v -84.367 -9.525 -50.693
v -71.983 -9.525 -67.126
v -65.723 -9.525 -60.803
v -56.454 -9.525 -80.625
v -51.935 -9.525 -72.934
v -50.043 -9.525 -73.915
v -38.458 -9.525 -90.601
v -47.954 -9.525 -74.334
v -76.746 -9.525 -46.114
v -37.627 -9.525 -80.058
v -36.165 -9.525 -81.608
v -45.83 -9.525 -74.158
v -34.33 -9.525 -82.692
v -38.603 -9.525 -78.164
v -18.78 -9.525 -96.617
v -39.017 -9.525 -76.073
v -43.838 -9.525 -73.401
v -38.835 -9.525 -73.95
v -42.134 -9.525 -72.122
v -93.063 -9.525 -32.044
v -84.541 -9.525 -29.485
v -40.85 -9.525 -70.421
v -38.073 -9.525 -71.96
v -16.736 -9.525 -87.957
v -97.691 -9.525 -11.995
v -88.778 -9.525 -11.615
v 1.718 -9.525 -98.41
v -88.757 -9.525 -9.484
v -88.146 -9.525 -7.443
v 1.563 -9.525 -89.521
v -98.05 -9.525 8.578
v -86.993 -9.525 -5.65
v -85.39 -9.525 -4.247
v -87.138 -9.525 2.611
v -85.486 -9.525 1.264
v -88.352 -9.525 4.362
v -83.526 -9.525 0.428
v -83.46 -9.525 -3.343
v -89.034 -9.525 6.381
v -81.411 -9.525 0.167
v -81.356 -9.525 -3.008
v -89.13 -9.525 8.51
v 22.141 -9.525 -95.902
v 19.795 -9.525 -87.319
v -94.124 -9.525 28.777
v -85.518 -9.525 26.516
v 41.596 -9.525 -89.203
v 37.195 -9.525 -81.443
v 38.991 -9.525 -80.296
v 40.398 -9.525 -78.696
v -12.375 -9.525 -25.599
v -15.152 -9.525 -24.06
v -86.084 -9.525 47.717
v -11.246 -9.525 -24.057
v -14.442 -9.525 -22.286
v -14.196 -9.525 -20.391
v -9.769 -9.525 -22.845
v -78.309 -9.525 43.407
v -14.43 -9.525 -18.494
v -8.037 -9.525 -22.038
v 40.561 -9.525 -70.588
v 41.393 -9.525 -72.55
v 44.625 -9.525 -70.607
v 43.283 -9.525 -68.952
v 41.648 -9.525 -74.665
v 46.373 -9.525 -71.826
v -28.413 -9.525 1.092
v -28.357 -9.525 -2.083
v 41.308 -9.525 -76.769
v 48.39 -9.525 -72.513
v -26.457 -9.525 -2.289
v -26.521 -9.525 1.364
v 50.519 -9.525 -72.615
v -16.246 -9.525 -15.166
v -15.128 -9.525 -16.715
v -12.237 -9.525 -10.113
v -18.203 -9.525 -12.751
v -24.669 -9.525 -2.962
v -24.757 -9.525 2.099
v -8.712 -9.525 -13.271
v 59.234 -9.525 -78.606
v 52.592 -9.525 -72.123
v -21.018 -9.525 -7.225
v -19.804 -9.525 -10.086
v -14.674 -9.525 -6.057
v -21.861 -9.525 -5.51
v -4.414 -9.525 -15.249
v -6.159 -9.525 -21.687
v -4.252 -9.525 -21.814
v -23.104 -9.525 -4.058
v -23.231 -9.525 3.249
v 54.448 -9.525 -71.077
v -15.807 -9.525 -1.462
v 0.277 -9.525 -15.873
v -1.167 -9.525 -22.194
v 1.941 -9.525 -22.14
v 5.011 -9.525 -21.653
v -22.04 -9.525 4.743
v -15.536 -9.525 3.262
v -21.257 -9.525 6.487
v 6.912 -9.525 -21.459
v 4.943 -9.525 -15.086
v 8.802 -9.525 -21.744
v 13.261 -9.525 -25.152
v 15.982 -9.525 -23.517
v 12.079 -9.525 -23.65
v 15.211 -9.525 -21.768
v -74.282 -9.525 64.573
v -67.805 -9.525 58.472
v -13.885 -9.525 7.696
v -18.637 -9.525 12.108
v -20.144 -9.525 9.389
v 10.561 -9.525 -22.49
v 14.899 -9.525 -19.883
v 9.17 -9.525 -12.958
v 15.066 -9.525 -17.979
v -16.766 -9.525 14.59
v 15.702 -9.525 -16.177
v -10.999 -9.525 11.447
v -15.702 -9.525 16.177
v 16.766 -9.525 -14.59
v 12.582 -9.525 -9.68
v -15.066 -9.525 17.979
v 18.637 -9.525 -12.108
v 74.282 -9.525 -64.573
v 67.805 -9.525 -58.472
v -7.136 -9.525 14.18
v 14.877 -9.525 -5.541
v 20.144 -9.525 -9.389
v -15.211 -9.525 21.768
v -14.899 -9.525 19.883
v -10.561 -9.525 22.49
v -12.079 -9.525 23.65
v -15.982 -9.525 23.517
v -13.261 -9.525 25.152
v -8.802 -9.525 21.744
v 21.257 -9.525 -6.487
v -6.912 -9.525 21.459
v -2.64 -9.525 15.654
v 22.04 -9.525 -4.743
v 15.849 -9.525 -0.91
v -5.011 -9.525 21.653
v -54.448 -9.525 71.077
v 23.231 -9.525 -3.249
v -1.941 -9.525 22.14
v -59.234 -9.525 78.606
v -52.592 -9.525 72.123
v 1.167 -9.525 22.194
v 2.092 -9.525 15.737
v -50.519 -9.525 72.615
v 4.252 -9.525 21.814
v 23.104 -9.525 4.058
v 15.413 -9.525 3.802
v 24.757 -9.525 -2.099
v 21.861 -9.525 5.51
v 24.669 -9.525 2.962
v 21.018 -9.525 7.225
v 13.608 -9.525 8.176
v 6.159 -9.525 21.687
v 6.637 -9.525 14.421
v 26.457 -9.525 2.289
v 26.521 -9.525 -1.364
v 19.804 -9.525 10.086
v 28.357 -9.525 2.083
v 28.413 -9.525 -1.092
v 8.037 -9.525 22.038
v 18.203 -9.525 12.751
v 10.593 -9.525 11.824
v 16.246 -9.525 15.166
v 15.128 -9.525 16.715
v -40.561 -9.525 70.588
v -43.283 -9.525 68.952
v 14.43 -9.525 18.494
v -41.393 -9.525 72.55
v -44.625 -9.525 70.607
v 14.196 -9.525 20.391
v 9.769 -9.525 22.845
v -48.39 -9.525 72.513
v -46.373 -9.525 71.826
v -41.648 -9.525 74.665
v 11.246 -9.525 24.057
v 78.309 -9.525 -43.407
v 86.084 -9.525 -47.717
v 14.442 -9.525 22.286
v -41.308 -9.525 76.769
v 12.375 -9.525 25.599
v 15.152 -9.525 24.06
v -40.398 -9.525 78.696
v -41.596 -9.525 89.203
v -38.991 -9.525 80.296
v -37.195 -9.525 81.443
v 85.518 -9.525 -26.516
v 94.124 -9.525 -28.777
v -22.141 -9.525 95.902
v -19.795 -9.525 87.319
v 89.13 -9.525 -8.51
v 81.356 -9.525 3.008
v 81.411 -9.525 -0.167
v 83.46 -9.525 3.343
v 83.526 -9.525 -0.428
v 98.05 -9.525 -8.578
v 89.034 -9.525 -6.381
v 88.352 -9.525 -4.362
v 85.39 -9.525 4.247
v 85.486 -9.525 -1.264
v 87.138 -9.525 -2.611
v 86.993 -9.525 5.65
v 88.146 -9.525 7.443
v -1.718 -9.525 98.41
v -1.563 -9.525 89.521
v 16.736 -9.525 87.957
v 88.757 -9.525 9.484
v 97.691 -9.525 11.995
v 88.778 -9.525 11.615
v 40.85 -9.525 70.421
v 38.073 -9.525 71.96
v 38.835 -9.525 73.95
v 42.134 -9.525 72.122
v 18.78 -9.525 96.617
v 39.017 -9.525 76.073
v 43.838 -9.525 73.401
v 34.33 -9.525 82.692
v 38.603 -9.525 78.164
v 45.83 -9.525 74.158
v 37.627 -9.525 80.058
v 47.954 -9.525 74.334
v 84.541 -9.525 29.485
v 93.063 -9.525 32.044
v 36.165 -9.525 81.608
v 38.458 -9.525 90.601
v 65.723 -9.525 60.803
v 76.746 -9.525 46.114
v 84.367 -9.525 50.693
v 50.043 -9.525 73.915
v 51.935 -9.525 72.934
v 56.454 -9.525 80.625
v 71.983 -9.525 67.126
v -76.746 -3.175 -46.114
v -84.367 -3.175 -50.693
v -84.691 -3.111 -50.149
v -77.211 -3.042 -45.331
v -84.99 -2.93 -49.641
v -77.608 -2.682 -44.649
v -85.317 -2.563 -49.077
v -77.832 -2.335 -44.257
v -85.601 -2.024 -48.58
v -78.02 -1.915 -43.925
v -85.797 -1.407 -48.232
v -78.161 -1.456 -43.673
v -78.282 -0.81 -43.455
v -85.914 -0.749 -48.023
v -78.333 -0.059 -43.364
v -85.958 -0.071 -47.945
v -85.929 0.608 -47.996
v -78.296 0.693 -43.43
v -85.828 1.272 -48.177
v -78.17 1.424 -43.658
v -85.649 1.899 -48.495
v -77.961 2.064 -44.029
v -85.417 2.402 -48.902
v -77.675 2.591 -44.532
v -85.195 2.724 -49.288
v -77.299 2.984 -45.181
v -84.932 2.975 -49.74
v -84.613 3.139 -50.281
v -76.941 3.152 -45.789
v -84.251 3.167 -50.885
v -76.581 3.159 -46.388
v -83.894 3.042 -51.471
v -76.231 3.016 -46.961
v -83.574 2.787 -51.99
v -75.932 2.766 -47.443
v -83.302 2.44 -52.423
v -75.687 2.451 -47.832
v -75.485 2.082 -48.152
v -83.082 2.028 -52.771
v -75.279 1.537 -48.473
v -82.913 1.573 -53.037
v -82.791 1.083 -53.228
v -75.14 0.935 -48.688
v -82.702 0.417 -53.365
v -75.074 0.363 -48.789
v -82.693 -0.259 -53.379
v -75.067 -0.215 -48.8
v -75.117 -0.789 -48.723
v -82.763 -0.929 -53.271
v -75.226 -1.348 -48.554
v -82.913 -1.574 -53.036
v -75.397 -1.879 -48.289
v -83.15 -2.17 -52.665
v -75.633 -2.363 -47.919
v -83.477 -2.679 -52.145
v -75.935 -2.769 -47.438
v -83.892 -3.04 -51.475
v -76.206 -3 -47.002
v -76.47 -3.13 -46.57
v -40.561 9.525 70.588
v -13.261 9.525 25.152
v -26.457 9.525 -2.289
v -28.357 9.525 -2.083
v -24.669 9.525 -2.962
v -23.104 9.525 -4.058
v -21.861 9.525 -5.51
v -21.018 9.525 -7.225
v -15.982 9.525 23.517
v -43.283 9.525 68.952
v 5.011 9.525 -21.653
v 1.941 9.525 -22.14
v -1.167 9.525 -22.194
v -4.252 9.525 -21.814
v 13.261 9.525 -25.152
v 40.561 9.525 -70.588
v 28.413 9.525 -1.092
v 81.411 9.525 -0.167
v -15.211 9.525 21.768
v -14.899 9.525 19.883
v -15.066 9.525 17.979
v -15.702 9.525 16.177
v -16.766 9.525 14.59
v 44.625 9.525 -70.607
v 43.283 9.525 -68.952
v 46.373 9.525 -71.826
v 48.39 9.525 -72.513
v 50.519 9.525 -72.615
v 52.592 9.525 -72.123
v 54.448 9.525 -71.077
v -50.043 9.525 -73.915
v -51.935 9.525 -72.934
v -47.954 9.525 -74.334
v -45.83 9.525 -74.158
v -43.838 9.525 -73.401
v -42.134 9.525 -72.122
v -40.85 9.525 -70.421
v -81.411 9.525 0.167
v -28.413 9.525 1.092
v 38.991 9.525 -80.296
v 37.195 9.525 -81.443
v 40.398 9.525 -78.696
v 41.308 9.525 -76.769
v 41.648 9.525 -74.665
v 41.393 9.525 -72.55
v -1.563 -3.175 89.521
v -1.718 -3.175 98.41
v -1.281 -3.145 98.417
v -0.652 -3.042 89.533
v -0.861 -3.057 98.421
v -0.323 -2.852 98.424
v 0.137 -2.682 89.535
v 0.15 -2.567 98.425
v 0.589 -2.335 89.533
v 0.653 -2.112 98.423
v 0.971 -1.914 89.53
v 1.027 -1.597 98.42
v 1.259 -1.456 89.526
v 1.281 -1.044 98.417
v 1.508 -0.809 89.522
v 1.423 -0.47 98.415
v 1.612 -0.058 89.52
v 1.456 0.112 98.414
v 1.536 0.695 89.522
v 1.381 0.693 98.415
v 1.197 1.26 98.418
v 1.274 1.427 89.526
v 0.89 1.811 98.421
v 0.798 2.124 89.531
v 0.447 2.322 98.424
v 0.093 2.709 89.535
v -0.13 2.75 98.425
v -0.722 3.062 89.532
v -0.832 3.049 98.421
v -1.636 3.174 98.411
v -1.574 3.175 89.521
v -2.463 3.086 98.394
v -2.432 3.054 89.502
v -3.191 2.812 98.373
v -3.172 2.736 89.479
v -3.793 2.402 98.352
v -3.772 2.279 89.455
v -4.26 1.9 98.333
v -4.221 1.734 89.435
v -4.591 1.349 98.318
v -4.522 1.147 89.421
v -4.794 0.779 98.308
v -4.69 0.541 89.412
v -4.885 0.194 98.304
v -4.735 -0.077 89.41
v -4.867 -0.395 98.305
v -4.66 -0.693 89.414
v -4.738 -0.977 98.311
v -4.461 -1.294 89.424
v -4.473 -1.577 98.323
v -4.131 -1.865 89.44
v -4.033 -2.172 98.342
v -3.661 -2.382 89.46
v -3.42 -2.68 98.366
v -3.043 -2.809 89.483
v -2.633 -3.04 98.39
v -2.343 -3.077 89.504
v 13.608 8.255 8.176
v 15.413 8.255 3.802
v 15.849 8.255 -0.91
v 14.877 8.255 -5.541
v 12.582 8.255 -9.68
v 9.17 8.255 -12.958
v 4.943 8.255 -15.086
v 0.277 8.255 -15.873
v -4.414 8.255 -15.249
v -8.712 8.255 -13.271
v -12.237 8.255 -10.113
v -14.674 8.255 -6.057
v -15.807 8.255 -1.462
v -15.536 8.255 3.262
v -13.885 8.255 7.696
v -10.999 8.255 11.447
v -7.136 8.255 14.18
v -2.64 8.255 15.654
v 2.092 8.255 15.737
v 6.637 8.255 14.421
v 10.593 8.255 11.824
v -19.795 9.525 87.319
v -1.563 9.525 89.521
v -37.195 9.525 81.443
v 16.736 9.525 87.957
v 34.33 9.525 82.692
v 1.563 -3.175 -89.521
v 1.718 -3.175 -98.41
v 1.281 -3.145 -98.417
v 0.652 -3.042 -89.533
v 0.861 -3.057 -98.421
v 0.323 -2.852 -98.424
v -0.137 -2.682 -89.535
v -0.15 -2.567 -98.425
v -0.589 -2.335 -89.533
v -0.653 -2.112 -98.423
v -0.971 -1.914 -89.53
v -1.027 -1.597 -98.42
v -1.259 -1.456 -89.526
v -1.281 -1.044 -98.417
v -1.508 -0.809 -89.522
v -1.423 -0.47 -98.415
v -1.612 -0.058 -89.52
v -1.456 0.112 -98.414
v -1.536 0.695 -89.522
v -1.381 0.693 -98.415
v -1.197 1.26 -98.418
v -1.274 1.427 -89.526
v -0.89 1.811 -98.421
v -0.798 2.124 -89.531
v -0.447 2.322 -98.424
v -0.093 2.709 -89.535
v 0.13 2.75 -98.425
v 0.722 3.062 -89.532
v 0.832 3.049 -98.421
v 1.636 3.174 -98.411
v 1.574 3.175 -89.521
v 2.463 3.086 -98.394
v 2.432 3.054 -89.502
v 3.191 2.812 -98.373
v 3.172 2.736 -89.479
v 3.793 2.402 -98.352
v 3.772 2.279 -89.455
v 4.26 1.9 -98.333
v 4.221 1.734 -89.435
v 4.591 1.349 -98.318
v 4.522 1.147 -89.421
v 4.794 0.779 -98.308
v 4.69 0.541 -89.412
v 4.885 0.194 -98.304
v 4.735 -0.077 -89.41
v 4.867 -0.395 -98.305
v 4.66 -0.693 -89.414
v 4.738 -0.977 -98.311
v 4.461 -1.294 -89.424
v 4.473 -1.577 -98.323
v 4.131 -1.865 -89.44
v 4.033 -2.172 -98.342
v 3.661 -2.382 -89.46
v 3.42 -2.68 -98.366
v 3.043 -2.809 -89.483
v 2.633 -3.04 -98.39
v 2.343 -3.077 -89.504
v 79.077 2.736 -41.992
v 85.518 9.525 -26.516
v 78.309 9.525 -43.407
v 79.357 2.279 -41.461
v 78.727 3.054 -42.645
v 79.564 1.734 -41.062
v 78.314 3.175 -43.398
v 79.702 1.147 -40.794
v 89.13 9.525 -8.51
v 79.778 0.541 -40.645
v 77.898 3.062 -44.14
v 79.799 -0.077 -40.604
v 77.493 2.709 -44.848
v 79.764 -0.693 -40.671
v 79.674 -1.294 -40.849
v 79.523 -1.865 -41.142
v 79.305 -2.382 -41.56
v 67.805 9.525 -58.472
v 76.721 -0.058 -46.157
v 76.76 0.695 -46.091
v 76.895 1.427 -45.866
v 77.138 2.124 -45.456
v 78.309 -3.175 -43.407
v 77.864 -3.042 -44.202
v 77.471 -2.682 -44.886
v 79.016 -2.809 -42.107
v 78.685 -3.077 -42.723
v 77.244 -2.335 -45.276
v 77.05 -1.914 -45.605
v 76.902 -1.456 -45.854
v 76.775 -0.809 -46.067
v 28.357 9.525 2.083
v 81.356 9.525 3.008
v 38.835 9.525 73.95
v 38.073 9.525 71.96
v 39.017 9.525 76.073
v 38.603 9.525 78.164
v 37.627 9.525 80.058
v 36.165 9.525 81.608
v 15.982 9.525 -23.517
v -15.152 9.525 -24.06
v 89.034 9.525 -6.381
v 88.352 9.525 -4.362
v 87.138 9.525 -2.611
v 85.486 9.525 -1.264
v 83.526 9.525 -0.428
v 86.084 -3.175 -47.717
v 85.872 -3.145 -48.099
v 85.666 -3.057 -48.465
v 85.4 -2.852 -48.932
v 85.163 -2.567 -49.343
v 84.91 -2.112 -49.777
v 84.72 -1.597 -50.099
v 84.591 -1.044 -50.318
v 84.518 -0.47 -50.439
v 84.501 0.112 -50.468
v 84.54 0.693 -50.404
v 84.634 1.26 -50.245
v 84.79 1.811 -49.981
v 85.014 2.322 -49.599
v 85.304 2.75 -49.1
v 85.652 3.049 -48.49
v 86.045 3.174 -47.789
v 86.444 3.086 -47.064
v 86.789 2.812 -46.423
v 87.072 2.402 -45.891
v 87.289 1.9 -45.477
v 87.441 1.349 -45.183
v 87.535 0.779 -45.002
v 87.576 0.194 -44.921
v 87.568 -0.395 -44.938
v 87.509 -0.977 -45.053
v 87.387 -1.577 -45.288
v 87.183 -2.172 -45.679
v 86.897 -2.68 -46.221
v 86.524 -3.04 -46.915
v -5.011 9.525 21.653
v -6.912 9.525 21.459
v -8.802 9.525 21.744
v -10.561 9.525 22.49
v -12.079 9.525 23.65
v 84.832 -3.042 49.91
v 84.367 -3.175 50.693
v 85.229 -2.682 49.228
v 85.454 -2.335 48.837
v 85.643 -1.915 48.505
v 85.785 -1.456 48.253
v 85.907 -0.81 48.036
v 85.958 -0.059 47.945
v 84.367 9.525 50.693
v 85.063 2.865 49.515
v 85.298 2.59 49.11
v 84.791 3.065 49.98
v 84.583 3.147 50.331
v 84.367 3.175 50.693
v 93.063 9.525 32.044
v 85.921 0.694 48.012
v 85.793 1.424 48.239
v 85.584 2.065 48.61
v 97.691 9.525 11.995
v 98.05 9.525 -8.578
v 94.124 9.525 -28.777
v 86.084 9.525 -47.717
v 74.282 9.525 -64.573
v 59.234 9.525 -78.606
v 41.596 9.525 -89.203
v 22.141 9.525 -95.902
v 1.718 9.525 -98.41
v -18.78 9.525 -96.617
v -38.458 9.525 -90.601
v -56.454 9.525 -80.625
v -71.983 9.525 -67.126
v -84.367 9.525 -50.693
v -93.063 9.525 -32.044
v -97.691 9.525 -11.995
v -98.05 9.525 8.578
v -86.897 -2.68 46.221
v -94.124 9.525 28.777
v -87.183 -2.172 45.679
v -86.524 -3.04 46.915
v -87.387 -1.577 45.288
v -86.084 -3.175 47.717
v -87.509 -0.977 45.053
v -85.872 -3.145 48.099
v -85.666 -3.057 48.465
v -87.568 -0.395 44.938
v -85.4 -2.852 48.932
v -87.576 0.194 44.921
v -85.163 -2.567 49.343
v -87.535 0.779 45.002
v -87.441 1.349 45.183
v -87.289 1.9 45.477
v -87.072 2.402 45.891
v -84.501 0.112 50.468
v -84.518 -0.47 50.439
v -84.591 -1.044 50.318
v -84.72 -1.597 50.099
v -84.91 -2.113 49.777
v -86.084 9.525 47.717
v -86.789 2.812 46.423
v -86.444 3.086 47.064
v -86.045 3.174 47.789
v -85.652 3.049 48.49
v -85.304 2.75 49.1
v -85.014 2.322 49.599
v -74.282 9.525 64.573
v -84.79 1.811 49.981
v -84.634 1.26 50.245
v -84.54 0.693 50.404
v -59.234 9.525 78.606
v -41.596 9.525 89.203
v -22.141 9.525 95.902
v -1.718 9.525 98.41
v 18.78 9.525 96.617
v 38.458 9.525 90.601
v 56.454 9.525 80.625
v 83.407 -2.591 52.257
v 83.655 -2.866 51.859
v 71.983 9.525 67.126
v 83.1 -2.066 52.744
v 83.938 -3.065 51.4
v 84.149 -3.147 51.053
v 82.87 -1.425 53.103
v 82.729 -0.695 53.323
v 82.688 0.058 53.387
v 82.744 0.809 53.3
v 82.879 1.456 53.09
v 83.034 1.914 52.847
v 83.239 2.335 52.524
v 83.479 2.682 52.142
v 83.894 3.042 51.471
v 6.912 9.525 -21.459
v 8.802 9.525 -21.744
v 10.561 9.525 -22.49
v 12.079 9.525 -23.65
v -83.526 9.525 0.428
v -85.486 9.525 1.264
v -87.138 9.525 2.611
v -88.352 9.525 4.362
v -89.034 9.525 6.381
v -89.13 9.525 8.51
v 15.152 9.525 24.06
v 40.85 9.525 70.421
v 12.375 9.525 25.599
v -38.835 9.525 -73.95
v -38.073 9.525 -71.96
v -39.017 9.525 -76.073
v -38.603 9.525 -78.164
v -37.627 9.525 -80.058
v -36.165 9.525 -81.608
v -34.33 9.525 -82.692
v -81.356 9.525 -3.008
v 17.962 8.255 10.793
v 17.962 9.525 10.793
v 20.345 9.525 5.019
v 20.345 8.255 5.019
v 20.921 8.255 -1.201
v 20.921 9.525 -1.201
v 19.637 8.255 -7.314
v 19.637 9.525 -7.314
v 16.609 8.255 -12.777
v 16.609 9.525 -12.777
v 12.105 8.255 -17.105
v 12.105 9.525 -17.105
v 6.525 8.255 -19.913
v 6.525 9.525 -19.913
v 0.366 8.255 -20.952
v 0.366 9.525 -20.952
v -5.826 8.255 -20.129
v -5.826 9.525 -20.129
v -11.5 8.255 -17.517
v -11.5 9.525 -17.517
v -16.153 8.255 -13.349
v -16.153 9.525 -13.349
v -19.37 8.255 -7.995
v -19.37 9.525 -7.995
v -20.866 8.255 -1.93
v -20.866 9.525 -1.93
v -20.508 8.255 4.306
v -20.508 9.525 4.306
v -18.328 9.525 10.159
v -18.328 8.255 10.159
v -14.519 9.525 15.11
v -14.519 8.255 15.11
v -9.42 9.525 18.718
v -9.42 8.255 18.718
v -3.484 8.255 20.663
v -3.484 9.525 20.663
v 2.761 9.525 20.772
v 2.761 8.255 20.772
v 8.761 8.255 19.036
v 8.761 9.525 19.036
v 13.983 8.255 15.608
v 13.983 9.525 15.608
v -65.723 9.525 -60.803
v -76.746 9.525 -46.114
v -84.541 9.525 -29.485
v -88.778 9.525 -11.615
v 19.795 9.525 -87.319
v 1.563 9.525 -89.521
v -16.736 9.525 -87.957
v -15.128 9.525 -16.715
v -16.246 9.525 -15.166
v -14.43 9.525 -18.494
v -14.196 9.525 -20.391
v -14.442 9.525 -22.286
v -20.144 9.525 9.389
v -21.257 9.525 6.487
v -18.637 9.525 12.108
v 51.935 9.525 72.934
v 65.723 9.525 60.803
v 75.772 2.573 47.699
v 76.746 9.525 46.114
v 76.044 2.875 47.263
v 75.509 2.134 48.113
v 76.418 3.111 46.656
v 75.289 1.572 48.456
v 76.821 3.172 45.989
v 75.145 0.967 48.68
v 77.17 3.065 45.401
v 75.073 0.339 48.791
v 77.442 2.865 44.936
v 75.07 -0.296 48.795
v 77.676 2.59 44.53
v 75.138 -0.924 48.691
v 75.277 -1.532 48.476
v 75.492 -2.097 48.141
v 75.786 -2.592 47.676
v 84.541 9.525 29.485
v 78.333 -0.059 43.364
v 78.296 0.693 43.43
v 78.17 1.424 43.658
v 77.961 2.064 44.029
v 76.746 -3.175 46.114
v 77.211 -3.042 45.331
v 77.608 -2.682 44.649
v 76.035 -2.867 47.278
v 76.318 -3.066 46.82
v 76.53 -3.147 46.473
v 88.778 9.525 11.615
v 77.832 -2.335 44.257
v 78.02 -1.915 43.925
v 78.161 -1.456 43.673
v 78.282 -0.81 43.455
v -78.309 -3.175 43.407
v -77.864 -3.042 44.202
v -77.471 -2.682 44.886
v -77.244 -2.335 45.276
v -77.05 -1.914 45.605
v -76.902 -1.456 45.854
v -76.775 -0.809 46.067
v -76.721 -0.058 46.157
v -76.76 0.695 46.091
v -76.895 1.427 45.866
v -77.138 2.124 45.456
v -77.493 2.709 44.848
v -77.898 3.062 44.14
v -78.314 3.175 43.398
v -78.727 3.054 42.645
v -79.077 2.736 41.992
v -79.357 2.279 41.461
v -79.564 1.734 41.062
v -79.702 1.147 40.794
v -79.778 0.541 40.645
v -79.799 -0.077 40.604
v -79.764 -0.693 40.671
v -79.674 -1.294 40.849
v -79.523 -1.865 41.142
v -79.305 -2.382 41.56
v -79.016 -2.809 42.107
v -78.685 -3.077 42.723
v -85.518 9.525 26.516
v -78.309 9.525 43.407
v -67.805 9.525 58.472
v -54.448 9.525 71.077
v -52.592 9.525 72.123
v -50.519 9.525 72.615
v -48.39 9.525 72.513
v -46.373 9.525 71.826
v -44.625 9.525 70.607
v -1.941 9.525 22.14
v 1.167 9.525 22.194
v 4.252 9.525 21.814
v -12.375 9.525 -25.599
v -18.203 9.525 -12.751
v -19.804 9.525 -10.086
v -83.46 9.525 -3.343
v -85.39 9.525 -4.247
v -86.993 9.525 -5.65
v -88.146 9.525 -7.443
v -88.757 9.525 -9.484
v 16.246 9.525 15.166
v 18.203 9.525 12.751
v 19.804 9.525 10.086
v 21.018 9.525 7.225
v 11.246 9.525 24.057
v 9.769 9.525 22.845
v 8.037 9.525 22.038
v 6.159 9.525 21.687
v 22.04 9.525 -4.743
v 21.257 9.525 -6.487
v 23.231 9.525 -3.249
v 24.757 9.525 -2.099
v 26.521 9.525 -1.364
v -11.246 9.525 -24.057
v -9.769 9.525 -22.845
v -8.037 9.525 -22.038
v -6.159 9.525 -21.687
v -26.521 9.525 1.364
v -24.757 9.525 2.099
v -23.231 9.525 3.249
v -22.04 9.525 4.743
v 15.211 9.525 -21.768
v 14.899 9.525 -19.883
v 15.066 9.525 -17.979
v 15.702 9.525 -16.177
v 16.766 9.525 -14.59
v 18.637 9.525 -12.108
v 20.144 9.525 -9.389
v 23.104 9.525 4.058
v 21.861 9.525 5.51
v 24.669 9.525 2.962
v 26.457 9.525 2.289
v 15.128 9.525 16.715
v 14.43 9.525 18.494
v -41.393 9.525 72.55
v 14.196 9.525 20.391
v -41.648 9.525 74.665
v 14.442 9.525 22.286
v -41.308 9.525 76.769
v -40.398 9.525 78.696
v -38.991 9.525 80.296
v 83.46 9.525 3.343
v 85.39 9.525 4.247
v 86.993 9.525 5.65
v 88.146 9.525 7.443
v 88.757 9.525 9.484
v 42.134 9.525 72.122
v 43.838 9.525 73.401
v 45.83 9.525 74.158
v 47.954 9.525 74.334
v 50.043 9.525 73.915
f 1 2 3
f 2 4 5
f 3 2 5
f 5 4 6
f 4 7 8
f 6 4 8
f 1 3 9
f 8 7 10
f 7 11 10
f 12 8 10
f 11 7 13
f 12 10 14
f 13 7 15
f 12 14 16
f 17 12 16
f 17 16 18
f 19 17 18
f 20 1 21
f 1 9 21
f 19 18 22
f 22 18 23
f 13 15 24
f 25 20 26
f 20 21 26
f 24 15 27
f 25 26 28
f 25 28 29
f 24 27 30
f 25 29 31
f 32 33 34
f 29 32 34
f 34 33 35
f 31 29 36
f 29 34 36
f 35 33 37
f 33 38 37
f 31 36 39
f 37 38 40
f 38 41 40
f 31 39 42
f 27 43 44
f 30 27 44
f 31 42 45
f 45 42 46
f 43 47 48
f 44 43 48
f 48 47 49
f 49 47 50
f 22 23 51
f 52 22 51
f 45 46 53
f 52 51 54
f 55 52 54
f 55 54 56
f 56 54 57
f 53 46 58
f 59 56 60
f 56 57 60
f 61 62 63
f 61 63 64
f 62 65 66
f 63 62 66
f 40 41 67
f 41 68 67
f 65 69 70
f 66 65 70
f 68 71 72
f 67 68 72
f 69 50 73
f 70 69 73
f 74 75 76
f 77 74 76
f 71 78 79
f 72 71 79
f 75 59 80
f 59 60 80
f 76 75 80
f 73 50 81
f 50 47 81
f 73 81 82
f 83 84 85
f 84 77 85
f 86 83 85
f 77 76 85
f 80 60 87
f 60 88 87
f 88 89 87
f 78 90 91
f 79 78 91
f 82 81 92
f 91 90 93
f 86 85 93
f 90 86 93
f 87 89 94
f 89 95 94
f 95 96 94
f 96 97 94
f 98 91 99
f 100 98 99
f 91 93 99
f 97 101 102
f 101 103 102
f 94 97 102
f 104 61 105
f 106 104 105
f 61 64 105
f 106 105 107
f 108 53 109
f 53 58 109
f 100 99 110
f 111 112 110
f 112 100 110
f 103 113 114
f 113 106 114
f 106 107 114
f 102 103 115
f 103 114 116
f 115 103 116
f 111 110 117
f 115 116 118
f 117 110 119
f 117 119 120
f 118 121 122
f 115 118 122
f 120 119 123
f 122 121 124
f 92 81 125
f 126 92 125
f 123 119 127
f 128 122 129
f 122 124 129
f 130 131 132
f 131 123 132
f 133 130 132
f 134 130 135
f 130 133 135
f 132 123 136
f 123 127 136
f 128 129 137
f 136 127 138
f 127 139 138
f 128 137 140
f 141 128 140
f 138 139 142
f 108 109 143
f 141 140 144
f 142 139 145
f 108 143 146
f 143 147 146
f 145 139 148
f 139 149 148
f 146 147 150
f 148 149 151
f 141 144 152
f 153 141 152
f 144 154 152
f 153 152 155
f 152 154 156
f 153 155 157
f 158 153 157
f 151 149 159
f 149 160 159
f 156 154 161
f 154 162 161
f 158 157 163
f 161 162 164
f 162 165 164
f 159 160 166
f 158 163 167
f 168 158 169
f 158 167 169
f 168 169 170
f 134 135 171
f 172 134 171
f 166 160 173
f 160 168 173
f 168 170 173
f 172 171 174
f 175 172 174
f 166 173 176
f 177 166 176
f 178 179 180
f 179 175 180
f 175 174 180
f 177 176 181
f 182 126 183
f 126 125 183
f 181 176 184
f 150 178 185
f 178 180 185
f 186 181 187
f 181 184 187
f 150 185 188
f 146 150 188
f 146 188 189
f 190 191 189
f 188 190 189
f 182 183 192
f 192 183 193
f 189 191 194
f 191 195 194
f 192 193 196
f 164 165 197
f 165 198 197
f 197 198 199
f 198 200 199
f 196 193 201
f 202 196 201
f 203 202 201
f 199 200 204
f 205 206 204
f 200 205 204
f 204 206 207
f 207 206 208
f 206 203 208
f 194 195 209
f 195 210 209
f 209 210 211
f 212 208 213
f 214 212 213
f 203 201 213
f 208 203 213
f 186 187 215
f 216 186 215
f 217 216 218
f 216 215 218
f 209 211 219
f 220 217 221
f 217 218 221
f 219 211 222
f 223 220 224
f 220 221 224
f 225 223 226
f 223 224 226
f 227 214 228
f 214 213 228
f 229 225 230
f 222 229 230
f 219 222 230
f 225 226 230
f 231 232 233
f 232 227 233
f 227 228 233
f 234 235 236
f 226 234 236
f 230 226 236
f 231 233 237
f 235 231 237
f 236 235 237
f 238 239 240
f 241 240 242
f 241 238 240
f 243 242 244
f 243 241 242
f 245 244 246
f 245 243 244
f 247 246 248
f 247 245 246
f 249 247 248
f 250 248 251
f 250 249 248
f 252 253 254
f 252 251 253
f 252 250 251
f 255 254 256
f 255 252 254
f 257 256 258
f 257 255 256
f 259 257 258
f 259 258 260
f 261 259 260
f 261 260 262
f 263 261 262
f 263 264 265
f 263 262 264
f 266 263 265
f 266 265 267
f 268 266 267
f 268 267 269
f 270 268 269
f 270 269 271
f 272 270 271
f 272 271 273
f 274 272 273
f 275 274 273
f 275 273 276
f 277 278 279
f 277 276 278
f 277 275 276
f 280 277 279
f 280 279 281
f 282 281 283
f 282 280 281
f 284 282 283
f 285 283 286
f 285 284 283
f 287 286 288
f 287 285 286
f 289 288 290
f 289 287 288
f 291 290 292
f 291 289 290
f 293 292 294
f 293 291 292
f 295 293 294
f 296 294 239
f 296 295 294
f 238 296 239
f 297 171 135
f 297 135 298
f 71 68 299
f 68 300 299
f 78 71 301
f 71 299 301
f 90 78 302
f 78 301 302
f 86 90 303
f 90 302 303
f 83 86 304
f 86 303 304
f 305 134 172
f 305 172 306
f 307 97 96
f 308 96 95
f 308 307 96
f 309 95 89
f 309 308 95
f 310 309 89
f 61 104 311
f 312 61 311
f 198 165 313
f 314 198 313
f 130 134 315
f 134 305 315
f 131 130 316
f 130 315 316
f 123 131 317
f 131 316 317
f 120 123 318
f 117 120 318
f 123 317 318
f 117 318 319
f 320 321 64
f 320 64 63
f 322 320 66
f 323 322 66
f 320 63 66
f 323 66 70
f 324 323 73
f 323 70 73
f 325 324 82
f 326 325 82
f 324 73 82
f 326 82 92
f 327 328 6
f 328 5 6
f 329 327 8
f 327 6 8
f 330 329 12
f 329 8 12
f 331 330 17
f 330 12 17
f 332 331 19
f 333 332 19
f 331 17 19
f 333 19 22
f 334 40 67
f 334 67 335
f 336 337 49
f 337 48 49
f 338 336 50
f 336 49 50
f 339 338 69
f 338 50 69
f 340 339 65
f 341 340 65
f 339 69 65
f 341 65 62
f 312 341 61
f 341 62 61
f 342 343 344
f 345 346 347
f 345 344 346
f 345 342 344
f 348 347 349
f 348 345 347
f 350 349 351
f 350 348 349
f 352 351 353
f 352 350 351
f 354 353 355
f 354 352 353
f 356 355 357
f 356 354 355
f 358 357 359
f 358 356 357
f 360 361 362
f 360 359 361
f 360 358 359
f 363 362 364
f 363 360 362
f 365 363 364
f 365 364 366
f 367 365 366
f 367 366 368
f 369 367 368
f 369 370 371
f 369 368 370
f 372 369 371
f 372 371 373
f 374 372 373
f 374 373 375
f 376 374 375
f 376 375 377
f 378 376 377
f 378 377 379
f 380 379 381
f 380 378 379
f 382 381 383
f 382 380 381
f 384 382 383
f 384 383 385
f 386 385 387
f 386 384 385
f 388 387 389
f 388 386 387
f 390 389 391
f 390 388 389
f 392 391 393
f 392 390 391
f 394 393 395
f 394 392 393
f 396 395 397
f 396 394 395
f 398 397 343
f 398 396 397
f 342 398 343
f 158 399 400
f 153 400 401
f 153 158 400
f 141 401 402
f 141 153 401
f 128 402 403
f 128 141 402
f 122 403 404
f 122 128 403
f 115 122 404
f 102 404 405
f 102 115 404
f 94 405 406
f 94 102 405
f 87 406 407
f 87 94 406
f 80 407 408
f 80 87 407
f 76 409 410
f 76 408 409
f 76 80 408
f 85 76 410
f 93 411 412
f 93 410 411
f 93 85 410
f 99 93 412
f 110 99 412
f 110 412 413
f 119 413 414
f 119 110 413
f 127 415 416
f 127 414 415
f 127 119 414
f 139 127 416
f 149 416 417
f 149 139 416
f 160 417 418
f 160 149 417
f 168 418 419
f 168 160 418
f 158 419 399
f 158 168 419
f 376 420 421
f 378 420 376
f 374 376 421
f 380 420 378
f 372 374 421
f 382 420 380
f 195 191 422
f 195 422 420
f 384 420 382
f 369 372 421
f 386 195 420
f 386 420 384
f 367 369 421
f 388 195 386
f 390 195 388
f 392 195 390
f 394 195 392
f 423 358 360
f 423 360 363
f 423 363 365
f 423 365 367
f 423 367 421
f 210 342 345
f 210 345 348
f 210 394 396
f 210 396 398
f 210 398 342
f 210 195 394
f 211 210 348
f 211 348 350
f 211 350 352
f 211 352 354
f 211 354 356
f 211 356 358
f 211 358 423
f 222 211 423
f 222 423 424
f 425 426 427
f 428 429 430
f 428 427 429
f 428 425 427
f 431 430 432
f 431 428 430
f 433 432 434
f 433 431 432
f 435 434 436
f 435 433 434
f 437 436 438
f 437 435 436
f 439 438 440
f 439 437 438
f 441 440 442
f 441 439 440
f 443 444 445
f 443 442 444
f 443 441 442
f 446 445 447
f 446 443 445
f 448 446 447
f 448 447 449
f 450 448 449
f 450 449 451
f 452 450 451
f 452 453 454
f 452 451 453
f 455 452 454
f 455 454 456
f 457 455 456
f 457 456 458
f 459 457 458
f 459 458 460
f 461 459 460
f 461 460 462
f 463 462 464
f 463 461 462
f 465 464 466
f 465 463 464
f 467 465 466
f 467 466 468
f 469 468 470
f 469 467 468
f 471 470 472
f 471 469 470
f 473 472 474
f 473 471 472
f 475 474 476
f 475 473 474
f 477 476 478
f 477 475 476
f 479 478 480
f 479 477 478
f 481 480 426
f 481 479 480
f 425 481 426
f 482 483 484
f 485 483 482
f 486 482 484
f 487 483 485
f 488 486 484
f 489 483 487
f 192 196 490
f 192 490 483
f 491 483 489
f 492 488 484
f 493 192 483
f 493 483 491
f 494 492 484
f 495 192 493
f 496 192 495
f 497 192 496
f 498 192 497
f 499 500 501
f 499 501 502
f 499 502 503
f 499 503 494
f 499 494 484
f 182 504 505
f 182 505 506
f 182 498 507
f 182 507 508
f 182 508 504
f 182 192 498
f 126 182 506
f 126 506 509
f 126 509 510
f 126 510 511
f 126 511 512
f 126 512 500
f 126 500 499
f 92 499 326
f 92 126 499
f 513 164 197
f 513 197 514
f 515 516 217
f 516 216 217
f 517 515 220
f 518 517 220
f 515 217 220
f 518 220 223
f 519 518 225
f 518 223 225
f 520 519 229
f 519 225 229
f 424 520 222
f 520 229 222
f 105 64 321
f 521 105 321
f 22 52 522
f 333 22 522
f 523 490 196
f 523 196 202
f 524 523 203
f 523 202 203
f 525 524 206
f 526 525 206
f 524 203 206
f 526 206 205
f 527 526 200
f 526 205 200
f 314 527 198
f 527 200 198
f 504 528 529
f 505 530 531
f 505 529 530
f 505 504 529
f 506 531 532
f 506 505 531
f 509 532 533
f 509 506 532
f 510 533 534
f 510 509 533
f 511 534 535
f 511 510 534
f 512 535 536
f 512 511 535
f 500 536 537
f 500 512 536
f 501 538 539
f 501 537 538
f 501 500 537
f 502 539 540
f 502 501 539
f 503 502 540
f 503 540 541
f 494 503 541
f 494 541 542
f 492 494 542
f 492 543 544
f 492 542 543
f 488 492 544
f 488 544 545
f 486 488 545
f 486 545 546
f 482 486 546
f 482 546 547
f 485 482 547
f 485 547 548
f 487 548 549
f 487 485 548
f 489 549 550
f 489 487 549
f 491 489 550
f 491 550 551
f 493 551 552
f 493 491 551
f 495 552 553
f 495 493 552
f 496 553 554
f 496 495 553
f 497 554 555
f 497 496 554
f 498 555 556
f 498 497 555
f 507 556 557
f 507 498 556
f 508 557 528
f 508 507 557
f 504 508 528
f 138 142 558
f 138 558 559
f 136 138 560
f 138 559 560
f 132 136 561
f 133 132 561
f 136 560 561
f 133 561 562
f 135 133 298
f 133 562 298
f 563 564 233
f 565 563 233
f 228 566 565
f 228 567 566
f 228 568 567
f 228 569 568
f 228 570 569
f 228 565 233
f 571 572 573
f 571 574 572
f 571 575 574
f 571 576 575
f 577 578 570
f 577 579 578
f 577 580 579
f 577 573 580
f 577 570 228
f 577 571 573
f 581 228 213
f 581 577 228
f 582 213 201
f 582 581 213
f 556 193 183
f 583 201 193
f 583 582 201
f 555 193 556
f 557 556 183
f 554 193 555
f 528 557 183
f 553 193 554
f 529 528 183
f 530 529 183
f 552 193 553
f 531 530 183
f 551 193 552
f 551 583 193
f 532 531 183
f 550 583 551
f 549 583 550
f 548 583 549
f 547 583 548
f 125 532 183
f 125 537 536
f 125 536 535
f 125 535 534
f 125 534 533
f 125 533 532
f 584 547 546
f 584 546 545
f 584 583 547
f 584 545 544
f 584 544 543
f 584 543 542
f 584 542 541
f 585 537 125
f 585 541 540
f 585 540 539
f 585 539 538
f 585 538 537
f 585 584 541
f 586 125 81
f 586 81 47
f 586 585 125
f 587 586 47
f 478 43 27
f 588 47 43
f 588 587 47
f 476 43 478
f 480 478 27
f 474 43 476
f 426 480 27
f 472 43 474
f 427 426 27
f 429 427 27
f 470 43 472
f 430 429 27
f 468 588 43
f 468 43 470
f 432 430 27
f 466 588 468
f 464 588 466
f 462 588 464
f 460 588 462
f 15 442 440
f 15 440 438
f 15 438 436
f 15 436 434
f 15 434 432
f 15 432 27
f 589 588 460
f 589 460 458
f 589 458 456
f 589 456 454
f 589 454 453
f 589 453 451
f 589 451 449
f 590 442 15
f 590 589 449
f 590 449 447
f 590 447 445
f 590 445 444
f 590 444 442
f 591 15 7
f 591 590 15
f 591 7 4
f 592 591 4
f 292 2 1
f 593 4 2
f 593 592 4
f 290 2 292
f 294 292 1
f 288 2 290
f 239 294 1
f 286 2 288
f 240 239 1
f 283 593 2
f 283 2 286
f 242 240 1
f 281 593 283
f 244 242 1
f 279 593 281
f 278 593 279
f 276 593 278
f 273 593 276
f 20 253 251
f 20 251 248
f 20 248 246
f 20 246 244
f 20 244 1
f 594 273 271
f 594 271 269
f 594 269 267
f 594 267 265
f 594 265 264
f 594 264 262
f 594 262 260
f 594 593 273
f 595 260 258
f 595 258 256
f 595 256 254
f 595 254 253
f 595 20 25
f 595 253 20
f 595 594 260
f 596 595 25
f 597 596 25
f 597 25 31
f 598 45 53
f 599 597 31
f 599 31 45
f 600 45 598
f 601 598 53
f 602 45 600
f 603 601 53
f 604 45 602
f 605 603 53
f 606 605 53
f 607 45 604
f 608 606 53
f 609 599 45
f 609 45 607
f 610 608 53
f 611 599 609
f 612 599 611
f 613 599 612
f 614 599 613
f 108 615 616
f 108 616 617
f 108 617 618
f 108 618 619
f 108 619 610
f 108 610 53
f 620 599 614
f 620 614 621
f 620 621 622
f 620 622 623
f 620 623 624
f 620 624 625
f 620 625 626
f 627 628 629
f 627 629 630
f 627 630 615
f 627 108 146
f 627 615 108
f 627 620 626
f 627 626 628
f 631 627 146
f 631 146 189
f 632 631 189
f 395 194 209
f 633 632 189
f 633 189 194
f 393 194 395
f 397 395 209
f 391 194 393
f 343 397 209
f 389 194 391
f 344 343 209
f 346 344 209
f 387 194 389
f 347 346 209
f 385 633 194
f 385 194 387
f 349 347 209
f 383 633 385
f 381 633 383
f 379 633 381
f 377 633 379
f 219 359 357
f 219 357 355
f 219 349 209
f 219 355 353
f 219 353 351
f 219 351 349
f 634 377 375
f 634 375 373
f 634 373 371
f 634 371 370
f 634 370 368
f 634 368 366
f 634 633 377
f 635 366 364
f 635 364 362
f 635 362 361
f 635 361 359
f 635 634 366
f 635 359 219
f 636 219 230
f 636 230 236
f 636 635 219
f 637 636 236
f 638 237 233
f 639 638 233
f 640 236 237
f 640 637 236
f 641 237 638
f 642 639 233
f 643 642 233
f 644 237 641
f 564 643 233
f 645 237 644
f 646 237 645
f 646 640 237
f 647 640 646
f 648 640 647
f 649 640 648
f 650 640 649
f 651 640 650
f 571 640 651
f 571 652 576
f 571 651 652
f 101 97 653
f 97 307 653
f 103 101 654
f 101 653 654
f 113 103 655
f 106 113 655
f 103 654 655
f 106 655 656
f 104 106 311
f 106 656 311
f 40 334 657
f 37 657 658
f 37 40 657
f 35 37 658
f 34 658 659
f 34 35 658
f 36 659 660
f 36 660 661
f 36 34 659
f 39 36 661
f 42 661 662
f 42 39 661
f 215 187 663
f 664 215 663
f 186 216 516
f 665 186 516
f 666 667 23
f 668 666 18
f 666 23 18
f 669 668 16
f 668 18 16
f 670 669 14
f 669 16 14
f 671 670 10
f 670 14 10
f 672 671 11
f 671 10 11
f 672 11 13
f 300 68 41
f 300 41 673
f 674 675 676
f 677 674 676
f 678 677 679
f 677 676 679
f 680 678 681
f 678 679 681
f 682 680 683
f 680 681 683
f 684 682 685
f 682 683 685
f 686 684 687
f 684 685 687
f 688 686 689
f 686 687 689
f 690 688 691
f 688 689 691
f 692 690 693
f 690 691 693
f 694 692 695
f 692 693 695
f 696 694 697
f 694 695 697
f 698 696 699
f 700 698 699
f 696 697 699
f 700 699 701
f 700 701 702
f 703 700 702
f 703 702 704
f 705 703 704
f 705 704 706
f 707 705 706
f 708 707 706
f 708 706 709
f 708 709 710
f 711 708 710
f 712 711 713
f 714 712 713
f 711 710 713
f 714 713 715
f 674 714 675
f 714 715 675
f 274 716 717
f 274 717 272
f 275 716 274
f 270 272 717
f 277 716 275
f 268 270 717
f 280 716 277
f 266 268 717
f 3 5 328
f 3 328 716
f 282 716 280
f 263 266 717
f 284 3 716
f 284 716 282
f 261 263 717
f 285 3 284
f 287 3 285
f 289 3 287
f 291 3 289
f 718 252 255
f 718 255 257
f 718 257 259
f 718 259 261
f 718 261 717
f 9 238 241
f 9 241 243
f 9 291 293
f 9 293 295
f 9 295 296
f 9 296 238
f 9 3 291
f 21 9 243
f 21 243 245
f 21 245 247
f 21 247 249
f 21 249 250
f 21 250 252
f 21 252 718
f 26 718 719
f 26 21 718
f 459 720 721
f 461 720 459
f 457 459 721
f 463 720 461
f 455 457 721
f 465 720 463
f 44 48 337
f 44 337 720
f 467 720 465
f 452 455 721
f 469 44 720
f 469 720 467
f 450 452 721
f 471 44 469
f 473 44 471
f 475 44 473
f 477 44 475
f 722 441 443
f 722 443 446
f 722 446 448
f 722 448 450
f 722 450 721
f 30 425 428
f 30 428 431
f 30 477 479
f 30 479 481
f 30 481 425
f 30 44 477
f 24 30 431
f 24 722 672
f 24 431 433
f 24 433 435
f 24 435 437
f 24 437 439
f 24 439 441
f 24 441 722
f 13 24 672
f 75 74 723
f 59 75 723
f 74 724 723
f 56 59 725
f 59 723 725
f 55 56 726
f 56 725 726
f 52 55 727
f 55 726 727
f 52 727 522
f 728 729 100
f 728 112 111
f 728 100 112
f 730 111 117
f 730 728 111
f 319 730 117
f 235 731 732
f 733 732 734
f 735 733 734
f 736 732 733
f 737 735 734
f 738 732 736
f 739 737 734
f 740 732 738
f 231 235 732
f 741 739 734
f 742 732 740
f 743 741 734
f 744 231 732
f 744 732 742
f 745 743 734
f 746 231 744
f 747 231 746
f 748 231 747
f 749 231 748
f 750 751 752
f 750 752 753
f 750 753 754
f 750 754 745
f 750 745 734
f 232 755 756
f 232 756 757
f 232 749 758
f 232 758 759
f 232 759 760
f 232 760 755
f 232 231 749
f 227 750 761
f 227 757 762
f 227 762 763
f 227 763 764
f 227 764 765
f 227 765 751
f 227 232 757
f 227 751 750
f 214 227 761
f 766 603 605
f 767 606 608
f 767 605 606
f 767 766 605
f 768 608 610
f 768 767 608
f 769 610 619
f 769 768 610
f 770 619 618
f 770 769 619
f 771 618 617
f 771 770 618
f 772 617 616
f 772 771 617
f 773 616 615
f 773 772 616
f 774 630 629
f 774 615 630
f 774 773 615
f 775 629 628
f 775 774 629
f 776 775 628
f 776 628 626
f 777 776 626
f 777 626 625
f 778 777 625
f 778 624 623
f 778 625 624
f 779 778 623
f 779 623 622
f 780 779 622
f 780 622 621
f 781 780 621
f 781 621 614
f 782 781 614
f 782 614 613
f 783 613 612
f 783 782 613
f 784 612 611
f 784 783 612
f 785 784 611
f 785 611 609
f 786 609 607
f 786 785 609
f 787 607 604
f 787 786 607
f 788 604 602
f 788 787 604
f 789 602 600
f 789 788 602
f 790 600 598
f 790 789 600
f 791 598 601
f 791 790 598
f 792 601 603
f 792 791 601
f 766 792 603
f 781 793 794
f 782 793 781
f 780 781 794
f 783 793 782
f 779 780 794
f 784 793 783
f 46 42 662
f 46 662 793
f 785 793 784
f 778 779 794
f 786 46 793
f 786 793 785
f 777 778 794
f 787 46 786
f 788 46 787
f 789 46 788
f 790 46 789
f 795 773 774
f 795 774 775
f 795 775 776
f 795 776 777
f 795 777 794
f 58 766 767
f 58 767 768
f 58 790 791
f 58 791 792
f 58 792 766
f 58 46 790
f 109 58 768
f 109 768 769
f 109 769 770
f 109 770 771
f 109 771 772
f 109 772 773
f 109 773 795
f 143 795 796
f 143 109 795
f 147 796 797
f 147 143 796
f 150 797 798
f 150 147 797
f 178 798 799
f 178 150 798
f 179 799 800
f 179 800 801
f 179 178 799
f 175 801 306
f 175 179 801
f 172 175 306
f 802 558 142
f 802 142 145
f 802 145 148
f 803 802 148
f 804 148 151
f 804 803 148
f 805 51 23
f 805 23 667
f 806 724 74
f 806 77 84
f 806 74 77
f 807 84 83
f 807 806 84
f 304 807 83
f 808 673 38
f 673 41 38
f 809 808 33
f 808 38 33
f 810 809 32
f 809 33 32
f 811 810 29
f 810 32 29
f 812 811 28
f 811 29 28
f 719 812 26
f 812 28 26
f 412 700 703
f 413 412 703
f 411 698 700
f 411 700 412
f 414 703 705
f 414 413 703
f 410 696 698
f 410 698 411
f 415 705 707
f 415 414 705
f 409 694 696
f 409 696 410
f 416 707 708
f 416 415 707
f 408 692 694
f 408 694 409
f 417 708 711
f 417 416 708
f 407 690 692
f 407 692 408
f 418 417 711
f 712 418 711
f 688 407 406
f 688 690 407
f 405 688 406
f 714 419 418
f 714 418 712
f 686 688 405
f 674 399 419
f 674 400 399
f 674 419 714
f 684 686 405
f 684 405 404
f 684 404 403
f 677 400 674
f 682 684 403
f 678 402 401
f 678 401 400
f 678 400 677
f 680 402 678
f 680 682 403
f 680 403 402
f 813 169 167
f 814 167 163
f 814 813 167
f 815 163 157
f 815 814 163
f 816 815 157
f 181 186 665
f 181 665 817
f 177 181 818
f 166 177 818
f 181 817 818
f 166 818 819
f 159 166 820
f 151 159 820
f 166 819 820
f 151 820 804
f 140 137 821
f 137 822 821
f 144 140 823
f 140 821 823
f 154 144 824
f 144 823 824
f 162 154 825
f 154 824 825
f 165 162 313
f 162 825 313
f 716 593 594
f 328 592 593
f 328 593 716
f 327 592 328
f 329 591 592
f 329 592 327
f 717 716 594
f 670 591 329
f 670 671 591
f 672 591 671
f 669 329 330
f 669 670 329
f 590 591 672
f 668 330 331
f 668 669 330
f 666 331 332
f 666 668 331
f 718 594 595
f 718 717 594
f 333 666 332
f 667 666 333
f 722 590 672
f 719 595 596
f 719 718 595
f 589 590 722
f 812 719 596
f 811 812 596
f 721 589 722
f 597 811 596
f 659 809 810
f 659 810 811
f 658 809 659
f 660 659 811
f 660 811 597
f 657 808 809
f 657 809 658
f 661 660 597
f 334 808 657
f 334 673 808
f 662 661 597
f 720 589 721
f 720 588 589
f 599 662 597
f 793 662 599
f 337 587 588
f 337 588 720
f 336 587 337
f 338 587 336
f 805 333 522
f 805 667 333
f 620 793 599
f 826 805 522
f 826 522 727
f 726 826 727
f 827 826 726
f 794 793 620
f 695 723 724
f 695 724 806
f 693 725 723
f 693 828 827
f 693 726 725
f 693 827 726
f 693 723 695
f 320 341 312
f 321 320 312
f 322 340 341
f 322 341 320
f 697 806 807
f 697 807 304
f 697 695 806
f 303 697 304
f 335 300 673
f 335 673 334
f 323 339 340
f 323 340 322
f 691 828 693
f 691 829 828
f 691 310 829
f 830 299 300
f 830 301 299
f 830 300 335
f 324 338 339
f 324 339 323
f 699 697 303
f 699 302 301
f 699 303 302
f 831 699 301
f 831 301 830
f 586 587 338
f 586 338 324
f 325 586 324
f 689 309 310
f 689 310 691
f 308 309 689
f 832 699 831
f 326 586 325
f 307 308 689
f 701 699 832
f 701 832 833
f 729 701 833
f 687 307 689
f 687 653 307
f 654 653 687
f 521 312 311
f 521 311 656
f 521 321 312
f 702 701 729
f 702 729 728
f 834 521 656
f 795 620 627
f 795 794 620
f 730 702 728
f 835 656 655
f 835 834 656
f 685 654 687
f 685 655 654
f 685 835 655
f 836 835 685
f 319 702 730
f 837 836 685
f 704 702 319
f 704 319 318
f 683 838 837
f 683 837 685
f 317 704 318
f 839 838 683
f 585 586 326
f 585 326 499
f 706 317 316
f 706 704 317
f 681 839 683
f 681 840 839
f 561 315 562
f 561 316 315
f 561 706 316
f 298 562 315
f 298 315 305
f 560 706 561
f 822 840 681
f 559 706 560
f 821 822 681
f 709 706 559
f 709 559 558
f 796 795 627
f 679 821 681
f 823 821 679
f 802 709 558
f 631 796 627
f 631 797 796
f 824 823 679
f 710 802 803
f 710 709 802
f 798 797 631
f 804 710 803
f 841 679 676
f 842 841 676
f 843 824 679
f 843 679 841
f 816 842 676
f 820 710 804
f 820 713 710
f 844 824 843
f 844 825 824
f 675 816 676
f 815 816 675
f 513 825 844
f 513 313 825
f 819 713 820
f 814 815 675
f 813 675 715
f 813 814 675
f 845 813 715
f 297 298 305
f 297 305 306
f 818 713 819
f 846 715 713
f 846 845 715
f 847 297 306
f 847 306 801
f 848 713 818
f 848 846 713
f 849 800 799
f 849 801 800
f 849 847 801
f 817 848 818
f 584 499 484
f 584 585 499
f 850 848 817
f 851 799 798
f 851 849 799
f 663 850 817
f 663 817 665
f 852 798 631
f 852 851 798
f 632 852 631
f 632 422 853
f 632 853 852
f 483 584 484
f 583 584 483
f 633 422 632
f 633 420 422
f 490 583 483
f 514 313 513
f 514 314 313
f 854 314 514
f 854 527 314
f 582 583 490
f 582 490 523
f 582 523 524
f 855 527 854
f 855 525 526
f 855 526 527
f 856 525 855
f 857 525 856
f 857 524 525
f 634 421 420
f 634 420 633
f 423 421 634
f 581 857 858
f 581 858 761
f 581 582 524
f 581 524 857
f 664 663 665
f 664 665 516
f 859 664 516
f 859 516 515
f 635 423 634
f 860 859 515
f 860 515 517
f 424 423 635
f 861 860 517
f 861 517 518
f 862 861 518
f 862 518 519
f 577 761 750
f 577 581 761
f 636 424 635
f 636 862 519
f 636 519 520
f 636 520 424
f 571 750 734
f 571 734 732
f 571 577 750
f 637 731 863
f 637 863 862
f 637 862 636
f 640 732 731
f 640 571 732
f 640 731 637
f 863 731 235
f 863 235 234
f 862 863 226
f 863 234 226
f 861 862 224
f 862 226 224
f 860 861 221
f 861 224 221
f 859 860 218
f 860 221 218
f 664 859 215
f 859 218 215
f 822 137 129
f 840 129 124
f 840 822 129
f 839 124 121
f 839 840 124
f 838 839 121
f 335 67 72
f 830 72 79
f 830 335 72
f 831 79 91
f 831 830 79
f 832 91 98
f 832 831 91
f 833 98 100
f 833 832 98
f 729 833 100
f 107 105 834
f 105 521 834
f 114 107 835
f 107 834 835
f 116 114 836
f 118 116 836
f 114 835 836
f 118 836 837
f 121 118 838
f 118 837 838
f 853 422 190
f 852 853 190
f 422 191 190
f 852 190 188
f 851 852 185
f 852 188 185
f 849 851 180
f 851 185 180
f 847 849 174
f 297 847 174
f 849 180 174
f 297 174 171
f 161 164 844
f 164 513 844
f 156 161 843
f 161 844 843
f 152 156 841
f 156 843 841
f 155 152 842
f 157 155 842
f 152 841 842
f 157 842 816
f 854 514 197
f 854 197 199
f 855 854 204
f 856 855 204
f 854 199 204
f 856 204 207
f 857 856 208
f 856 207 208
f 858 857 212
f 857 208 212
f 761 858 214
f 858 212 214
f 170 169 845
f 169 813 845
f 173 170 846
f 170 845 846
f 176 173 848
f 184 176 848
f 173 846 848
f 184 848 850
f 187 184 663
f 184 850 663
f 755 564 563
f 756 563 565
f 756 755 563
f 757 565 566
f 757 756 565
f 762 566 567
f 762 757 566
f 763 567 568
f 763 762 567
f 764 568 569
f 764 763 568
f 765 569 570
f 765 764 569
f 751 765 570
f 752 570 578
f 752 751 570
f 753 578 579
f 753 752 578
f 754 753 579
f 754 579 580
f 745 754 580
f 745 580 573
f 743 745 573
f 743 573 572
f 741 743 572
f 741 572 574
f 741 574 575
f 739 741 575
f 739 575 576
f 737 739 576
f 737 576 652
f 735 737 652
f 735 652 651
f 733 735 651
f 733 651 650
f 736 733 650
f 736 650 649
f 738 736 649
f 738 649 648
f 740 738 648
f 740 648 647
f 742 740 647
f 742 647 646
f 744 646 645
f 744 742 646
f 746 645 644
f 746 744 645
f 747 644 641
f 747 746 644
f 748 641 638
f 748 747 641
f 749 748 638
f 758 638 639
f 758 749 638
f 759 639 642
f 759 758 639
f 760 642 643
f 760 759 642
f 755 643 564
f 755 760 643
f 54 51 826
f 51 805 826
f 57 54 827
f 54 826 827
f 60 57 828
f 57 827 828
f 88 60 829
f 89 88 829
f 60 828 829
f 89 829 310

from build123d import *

# Parameters (mm, degrees)
CENTER_RING_R         = 22.225
CENTER_RING_R_2       = 15.875
CENTER_DEPTH          = 9.525
OUTER_R               = 98.425
OUTER_R_2             = 89.535
OUTER_RING_DEPTH      = 9.525
BEAM_START            = -25.456769
BEEAM_W               = 3.175
BEEAM_H               = 19.05
BEAM_DEPTH            = 67.366769
CIRPATTERN1_COUNT     = 6
FILLET1_R             = 7.62
SKETCH27_R            = 20.955
CUT_EXTRUDE3_DEPTH    = 1.27
CUT_EXTRUDE5_START    = -8.946312
SKETCH31_R            = 3.175
CUT_EXTRUDE5_DEPTH    = 8.946312
CIRPATTERN5_COUNT     = 6
BODY_MOVE_COPY7_ANGLE = 31


with BuildPart() as part:
    # Center Ring → Center (new body, symmetric)
    with BuildSketch(Plane(origin=(0, 0, 0), x_dir=(1, 0, 0), z_dir=(0, 1, 0))):
        Circle(CENTER_RING_R)
        Circle(CENTER_RING_R_2, mode=Mode.SUBTRACT)
    extrude(amount=CENTER_DEPTH, both=True)



with BuildPart() as body_2:
    # Outer → Outer Ring (new body, symmetric)
    with BuildSketch(Plane(origin=(0, 0, 0), x_dir=(1, 0, 0), z_dir=(0, 1, 0))):
        Circle(OUTER_R)
        Circle(OUTER_R_2, mode=Mode.SUBTRACT)
    extrude(amount=OUTER_RING_DEPTH, both=True)


with BuildPart() as part_1:
    add(part.part)

    add(body_2.part)  # Beam merges body 2
    # beeam → Beam (add)
    with BuildSketch(Plane.XY.offset(47.625).offset(BEAM_START)):
        Rectangle(BEEAM_W, BEEAM_H)
    beam = extrude(amount=BEAM_DEPTH)

    # CirPattern1: Beam ×6 about axis
    cirpattern1_axis = Axis((0, 0, 0), (0, 1, 0))
    for i in range(1, CIRPATTERN1_COUNT):
        add(beam.rotate(cirpattern1_axis, i * 360 / CIRPATTERN1_COUNT))

    # Fillet1
    fillet1_edges = [part_1.edges().sort_by_distance(p)[0] for p in [
        (-1.5875, 0, 22.168231),
        (-1.5875, 0, 89.520925312),
        (1.5875, 0, 22.168231),
        (1.5875, 0, 89.520925312),
        (-18.404501203, 0, 12.458930829),
        (-76.733645491, 0, 46.135277985),
        (-19.992001203, 0, 9.709300171),
        (-78.321145491, 0, 43.385647328),
        (-19.992001203, 0, -9.709300171),
        (-78.321145491, 0, -43.385647328),
        (-18.404501203, 0, -12.458930829),
        (-76.733645491, 0, -46.135277985),
        (1.5875, 0, -22.168231),
        (1.5875, 0, -89.520925312),
        (-1.5875, 0, -22.168231),
        (-1.5875, 0, -89.520925312),
        (19.992001203, 0, -9.709300171),
        (78.321145491, 0, -43.385647328),
        (18.404501203, 0, -12.458930829),
        (76.733645491, 0, -46.135277985),
        (18.404501203, 0, 12.458930829),
        (76.733645491, 0, 46.135277985),
        (19.992001203, 0, 9.709300171),
        (78.321145491, 0, 43.385647328),
    ]]
    fillet(fillet1_edges, radius=FILLET1_R)

    # Sketch27 → Cut-Extrude3 (cut)
    with BuildSketch(Plane(origin=(0, 9.525, 0), x_dir=(1, 0, 0), z_dir=(0, 1, 0))):
        Circle(SKETCH27_R)
    extrude(amount=-CUT_EXTRUDE3_DEPTH, mode=Mode.SUBTRACT)

    # Sketch31 → Cut-Extrude5 (cut)
    with BuildSketch(Plane(origin=(49.2125, 0, 85.238550367), x_dir=(0, -1, 0), z_dir=(0.5, 0, 0.866025404)).offset(CUT_EXTRUDE5_START)):
        Circle(SKETCH31_R)
    cut_extrude5 = extrude(amount=CUT_EXTRUDE5_DEPTH, mode=Mode.SUBTRACT)

    # CirPattern5: Cut-Extrude5 ×6 about axis
    cirpattern5_axis = Axis((0, 9.525, 0), (0, -1, 0))
    for i in range(1, CIRPATTERN5_COUNT):
        add(cut_extrude5.rotate(cirpattern5_axis, i * 360 / CIRPATTERN5_COUNT), mode=Mode.SUBTRACT)


with BuildPart() as part_2:
    # Body-Move/Copy7: moved
    add(part_1.part.rotate(Axis((0, 0, 0), (0, -1, 0)), BODY_MOVE_COPY7_ANGLE))


solid = part_2.part
